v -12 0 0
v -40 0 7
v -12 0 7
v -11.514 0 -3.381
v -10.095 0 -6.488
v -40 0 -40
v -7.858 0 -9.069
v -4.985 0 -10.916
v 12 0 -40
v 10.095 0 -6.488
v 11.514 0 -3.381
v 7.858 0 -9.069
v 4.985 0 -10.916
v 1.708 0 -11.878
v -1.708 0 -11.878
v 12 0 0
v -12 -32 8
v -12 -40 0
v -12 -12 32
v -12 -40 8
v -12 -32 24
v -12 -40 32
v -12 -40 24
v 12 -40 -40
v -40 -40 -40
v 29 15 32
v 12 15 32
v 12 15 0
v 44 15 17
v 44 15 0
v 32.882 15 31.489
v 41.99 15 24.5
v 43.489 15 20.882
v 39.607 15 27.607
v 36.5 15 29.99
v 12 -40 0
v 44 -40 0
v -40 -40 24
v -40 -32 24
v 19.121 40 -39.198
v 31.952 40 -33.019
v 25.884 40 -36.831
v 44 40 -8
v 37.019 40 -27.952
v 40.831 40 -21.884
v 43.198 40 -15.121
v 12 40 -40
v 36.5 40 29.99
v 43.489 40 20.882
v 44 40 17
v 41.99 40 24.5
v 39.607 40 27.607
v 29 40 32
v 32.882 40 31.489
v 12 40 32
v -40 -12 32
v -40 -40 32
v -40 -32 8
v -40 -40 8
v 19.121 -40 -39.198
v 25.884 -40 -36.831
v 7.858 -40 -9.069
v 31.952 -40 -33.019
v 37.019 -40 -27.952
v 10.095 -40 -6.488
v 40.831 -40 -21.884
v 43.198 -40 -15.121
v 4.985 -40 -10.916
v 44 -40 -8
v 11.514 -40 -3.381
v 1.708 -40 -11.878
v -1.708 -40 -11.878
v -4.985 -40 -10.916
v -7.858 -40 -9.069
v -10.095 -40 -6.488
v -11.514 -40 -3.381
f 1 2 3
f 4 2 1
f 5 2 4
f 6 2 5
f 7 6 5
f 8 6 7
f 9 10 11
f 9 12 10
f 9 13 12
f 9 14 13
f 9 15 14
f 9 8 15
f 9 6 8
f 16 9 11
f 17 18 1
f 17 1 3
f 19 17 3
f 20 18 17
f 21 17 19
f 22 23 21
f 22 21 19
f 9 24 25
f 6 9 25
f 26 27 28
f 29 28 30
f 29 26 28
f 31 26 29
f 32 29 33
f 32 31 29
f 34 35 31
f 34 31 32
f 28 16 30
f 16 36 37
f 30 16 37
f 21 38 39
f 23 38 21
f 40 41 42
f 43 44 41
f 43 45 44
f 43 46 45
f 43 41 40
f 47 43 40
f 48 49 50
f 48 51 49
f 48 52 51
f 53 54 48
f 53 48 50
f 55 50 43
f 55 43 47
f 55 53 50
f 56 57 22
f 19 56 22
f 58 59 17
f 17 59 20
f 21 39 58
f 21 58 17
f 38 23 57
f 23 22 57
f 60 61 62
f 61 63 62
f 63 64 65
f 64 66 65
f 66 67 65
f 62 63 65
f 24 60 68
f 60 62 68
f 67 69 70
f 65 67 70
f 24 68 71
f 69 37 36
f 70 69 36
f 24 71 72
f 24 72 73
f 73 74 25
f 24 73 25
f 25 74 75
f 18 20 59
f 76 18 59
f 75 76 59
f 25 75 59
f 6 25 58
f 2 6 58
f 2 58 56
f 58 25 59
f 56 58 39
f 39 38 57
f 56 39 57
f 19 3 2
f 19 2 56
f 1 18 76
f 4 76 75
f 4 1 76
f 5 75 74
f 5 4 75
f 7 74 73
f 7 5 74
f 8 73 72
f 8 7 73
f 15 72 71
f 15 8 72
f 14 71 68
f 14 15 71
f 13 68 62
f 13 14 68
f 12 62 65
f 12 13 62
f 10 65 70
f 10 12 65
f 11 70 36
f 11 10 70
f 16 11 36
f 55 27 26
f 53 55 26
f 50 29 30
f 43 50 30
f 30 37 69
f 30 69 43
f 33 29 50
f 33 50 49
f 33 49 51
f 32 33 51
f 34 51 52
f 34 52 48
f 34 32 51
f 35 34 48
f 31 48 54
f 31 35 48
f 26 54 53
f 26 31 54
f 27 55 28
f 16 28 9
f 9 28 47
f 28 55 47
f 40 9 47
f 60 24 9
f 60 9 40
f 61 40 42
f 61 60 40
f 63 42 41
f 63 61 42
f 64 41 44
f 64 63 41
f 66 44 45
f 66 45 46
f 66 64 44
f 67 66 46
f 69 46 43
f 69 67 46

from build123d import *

# Parameters (mm, degrees)
SKETCH_R        = 12
PAD_DEPTH       = 40
SKETCH001_W     = 75.633354
SKETCH001_H     = 46.920013
POCKET_DEPTH    = 55
SKETCH002_W     = 41.400021
SKETCH002_H     = 16
POCKET001_DEPTH = 8
SKETCH003_W     = 67.968546
SKETCH003_H     = 93.61967
POCKET002_DEPTH = 40
POCKET003_DEPTH = 28.001


with BuildPart() as part:
    # Sketch → Pad (new body, symmetric)
    with BuildSketch(Plane.XZ):
        with BuildLine():
            Line((-40, 32), (29, 32))
            ThreePointArc((44, 17), (39.606602, 27.606602), (29, 32))
            Line((44, 17), (44, -8))
            ThreePointArc((12, -40), (34.627417, -30.627417), (44, -8))
            Line((12, -40), (-40, -40))
            Line((-40, -40), (-40, 32))
        make_face()
        Circle(SKETCH_R, mode=Mode.SUBTRACT)
    extrude(amount=PAD_DEPTH, both=True)

    # Sketch001 → Pocket (cut)
    with BuildSketch(Plane.XZ.offset(40)):
        with Locations((25.816677, 23.460006)):
            Rectangle(SKETCH001_W, SKETCH001_H)
    extrude(amount=-POCKET_DEPTH, mode=Mode.SUBTRACT)

    # Sketch002 → Pocket001 (cut)
    with BuildSketch(Plane.XZ.offset(40)):
        with Locations((-28.213342, 16)):
            Rectangle(SKETCH002_W, SKETCH002_H)
    extrude(amount=-POCKET001_DEPTH, mode=Mode.SUBTRACT)

    # Sketch003 → Pocket002 (cut)
    with BuildSketch(Plane(origin=(0, 40, 0), x_dir=(1, 0, 0), z_dir=(0, 1, 0))):
        with Locations((-21.984273, 2.649843)):
            Rectangle(SKETCH003_W, SKETCH003_H)
    extrude(amount=-POCKET002_DEPTH, mode=Mode.SUBTRACT)

    # Sketch004 → Pocket003 (cut, through all)
    with BuildSketch(Plane(origin=(-12, 0, 0), x_dir=(0, 0, 1), z_dir=(1, 0, 0))):
        Polygon((32, 12), (32, 0), (7, 0), align=None)
    extrude(amount=-POCKET003_DEPTH, mode=Mode.SUBTRACT)


solid = part.part
